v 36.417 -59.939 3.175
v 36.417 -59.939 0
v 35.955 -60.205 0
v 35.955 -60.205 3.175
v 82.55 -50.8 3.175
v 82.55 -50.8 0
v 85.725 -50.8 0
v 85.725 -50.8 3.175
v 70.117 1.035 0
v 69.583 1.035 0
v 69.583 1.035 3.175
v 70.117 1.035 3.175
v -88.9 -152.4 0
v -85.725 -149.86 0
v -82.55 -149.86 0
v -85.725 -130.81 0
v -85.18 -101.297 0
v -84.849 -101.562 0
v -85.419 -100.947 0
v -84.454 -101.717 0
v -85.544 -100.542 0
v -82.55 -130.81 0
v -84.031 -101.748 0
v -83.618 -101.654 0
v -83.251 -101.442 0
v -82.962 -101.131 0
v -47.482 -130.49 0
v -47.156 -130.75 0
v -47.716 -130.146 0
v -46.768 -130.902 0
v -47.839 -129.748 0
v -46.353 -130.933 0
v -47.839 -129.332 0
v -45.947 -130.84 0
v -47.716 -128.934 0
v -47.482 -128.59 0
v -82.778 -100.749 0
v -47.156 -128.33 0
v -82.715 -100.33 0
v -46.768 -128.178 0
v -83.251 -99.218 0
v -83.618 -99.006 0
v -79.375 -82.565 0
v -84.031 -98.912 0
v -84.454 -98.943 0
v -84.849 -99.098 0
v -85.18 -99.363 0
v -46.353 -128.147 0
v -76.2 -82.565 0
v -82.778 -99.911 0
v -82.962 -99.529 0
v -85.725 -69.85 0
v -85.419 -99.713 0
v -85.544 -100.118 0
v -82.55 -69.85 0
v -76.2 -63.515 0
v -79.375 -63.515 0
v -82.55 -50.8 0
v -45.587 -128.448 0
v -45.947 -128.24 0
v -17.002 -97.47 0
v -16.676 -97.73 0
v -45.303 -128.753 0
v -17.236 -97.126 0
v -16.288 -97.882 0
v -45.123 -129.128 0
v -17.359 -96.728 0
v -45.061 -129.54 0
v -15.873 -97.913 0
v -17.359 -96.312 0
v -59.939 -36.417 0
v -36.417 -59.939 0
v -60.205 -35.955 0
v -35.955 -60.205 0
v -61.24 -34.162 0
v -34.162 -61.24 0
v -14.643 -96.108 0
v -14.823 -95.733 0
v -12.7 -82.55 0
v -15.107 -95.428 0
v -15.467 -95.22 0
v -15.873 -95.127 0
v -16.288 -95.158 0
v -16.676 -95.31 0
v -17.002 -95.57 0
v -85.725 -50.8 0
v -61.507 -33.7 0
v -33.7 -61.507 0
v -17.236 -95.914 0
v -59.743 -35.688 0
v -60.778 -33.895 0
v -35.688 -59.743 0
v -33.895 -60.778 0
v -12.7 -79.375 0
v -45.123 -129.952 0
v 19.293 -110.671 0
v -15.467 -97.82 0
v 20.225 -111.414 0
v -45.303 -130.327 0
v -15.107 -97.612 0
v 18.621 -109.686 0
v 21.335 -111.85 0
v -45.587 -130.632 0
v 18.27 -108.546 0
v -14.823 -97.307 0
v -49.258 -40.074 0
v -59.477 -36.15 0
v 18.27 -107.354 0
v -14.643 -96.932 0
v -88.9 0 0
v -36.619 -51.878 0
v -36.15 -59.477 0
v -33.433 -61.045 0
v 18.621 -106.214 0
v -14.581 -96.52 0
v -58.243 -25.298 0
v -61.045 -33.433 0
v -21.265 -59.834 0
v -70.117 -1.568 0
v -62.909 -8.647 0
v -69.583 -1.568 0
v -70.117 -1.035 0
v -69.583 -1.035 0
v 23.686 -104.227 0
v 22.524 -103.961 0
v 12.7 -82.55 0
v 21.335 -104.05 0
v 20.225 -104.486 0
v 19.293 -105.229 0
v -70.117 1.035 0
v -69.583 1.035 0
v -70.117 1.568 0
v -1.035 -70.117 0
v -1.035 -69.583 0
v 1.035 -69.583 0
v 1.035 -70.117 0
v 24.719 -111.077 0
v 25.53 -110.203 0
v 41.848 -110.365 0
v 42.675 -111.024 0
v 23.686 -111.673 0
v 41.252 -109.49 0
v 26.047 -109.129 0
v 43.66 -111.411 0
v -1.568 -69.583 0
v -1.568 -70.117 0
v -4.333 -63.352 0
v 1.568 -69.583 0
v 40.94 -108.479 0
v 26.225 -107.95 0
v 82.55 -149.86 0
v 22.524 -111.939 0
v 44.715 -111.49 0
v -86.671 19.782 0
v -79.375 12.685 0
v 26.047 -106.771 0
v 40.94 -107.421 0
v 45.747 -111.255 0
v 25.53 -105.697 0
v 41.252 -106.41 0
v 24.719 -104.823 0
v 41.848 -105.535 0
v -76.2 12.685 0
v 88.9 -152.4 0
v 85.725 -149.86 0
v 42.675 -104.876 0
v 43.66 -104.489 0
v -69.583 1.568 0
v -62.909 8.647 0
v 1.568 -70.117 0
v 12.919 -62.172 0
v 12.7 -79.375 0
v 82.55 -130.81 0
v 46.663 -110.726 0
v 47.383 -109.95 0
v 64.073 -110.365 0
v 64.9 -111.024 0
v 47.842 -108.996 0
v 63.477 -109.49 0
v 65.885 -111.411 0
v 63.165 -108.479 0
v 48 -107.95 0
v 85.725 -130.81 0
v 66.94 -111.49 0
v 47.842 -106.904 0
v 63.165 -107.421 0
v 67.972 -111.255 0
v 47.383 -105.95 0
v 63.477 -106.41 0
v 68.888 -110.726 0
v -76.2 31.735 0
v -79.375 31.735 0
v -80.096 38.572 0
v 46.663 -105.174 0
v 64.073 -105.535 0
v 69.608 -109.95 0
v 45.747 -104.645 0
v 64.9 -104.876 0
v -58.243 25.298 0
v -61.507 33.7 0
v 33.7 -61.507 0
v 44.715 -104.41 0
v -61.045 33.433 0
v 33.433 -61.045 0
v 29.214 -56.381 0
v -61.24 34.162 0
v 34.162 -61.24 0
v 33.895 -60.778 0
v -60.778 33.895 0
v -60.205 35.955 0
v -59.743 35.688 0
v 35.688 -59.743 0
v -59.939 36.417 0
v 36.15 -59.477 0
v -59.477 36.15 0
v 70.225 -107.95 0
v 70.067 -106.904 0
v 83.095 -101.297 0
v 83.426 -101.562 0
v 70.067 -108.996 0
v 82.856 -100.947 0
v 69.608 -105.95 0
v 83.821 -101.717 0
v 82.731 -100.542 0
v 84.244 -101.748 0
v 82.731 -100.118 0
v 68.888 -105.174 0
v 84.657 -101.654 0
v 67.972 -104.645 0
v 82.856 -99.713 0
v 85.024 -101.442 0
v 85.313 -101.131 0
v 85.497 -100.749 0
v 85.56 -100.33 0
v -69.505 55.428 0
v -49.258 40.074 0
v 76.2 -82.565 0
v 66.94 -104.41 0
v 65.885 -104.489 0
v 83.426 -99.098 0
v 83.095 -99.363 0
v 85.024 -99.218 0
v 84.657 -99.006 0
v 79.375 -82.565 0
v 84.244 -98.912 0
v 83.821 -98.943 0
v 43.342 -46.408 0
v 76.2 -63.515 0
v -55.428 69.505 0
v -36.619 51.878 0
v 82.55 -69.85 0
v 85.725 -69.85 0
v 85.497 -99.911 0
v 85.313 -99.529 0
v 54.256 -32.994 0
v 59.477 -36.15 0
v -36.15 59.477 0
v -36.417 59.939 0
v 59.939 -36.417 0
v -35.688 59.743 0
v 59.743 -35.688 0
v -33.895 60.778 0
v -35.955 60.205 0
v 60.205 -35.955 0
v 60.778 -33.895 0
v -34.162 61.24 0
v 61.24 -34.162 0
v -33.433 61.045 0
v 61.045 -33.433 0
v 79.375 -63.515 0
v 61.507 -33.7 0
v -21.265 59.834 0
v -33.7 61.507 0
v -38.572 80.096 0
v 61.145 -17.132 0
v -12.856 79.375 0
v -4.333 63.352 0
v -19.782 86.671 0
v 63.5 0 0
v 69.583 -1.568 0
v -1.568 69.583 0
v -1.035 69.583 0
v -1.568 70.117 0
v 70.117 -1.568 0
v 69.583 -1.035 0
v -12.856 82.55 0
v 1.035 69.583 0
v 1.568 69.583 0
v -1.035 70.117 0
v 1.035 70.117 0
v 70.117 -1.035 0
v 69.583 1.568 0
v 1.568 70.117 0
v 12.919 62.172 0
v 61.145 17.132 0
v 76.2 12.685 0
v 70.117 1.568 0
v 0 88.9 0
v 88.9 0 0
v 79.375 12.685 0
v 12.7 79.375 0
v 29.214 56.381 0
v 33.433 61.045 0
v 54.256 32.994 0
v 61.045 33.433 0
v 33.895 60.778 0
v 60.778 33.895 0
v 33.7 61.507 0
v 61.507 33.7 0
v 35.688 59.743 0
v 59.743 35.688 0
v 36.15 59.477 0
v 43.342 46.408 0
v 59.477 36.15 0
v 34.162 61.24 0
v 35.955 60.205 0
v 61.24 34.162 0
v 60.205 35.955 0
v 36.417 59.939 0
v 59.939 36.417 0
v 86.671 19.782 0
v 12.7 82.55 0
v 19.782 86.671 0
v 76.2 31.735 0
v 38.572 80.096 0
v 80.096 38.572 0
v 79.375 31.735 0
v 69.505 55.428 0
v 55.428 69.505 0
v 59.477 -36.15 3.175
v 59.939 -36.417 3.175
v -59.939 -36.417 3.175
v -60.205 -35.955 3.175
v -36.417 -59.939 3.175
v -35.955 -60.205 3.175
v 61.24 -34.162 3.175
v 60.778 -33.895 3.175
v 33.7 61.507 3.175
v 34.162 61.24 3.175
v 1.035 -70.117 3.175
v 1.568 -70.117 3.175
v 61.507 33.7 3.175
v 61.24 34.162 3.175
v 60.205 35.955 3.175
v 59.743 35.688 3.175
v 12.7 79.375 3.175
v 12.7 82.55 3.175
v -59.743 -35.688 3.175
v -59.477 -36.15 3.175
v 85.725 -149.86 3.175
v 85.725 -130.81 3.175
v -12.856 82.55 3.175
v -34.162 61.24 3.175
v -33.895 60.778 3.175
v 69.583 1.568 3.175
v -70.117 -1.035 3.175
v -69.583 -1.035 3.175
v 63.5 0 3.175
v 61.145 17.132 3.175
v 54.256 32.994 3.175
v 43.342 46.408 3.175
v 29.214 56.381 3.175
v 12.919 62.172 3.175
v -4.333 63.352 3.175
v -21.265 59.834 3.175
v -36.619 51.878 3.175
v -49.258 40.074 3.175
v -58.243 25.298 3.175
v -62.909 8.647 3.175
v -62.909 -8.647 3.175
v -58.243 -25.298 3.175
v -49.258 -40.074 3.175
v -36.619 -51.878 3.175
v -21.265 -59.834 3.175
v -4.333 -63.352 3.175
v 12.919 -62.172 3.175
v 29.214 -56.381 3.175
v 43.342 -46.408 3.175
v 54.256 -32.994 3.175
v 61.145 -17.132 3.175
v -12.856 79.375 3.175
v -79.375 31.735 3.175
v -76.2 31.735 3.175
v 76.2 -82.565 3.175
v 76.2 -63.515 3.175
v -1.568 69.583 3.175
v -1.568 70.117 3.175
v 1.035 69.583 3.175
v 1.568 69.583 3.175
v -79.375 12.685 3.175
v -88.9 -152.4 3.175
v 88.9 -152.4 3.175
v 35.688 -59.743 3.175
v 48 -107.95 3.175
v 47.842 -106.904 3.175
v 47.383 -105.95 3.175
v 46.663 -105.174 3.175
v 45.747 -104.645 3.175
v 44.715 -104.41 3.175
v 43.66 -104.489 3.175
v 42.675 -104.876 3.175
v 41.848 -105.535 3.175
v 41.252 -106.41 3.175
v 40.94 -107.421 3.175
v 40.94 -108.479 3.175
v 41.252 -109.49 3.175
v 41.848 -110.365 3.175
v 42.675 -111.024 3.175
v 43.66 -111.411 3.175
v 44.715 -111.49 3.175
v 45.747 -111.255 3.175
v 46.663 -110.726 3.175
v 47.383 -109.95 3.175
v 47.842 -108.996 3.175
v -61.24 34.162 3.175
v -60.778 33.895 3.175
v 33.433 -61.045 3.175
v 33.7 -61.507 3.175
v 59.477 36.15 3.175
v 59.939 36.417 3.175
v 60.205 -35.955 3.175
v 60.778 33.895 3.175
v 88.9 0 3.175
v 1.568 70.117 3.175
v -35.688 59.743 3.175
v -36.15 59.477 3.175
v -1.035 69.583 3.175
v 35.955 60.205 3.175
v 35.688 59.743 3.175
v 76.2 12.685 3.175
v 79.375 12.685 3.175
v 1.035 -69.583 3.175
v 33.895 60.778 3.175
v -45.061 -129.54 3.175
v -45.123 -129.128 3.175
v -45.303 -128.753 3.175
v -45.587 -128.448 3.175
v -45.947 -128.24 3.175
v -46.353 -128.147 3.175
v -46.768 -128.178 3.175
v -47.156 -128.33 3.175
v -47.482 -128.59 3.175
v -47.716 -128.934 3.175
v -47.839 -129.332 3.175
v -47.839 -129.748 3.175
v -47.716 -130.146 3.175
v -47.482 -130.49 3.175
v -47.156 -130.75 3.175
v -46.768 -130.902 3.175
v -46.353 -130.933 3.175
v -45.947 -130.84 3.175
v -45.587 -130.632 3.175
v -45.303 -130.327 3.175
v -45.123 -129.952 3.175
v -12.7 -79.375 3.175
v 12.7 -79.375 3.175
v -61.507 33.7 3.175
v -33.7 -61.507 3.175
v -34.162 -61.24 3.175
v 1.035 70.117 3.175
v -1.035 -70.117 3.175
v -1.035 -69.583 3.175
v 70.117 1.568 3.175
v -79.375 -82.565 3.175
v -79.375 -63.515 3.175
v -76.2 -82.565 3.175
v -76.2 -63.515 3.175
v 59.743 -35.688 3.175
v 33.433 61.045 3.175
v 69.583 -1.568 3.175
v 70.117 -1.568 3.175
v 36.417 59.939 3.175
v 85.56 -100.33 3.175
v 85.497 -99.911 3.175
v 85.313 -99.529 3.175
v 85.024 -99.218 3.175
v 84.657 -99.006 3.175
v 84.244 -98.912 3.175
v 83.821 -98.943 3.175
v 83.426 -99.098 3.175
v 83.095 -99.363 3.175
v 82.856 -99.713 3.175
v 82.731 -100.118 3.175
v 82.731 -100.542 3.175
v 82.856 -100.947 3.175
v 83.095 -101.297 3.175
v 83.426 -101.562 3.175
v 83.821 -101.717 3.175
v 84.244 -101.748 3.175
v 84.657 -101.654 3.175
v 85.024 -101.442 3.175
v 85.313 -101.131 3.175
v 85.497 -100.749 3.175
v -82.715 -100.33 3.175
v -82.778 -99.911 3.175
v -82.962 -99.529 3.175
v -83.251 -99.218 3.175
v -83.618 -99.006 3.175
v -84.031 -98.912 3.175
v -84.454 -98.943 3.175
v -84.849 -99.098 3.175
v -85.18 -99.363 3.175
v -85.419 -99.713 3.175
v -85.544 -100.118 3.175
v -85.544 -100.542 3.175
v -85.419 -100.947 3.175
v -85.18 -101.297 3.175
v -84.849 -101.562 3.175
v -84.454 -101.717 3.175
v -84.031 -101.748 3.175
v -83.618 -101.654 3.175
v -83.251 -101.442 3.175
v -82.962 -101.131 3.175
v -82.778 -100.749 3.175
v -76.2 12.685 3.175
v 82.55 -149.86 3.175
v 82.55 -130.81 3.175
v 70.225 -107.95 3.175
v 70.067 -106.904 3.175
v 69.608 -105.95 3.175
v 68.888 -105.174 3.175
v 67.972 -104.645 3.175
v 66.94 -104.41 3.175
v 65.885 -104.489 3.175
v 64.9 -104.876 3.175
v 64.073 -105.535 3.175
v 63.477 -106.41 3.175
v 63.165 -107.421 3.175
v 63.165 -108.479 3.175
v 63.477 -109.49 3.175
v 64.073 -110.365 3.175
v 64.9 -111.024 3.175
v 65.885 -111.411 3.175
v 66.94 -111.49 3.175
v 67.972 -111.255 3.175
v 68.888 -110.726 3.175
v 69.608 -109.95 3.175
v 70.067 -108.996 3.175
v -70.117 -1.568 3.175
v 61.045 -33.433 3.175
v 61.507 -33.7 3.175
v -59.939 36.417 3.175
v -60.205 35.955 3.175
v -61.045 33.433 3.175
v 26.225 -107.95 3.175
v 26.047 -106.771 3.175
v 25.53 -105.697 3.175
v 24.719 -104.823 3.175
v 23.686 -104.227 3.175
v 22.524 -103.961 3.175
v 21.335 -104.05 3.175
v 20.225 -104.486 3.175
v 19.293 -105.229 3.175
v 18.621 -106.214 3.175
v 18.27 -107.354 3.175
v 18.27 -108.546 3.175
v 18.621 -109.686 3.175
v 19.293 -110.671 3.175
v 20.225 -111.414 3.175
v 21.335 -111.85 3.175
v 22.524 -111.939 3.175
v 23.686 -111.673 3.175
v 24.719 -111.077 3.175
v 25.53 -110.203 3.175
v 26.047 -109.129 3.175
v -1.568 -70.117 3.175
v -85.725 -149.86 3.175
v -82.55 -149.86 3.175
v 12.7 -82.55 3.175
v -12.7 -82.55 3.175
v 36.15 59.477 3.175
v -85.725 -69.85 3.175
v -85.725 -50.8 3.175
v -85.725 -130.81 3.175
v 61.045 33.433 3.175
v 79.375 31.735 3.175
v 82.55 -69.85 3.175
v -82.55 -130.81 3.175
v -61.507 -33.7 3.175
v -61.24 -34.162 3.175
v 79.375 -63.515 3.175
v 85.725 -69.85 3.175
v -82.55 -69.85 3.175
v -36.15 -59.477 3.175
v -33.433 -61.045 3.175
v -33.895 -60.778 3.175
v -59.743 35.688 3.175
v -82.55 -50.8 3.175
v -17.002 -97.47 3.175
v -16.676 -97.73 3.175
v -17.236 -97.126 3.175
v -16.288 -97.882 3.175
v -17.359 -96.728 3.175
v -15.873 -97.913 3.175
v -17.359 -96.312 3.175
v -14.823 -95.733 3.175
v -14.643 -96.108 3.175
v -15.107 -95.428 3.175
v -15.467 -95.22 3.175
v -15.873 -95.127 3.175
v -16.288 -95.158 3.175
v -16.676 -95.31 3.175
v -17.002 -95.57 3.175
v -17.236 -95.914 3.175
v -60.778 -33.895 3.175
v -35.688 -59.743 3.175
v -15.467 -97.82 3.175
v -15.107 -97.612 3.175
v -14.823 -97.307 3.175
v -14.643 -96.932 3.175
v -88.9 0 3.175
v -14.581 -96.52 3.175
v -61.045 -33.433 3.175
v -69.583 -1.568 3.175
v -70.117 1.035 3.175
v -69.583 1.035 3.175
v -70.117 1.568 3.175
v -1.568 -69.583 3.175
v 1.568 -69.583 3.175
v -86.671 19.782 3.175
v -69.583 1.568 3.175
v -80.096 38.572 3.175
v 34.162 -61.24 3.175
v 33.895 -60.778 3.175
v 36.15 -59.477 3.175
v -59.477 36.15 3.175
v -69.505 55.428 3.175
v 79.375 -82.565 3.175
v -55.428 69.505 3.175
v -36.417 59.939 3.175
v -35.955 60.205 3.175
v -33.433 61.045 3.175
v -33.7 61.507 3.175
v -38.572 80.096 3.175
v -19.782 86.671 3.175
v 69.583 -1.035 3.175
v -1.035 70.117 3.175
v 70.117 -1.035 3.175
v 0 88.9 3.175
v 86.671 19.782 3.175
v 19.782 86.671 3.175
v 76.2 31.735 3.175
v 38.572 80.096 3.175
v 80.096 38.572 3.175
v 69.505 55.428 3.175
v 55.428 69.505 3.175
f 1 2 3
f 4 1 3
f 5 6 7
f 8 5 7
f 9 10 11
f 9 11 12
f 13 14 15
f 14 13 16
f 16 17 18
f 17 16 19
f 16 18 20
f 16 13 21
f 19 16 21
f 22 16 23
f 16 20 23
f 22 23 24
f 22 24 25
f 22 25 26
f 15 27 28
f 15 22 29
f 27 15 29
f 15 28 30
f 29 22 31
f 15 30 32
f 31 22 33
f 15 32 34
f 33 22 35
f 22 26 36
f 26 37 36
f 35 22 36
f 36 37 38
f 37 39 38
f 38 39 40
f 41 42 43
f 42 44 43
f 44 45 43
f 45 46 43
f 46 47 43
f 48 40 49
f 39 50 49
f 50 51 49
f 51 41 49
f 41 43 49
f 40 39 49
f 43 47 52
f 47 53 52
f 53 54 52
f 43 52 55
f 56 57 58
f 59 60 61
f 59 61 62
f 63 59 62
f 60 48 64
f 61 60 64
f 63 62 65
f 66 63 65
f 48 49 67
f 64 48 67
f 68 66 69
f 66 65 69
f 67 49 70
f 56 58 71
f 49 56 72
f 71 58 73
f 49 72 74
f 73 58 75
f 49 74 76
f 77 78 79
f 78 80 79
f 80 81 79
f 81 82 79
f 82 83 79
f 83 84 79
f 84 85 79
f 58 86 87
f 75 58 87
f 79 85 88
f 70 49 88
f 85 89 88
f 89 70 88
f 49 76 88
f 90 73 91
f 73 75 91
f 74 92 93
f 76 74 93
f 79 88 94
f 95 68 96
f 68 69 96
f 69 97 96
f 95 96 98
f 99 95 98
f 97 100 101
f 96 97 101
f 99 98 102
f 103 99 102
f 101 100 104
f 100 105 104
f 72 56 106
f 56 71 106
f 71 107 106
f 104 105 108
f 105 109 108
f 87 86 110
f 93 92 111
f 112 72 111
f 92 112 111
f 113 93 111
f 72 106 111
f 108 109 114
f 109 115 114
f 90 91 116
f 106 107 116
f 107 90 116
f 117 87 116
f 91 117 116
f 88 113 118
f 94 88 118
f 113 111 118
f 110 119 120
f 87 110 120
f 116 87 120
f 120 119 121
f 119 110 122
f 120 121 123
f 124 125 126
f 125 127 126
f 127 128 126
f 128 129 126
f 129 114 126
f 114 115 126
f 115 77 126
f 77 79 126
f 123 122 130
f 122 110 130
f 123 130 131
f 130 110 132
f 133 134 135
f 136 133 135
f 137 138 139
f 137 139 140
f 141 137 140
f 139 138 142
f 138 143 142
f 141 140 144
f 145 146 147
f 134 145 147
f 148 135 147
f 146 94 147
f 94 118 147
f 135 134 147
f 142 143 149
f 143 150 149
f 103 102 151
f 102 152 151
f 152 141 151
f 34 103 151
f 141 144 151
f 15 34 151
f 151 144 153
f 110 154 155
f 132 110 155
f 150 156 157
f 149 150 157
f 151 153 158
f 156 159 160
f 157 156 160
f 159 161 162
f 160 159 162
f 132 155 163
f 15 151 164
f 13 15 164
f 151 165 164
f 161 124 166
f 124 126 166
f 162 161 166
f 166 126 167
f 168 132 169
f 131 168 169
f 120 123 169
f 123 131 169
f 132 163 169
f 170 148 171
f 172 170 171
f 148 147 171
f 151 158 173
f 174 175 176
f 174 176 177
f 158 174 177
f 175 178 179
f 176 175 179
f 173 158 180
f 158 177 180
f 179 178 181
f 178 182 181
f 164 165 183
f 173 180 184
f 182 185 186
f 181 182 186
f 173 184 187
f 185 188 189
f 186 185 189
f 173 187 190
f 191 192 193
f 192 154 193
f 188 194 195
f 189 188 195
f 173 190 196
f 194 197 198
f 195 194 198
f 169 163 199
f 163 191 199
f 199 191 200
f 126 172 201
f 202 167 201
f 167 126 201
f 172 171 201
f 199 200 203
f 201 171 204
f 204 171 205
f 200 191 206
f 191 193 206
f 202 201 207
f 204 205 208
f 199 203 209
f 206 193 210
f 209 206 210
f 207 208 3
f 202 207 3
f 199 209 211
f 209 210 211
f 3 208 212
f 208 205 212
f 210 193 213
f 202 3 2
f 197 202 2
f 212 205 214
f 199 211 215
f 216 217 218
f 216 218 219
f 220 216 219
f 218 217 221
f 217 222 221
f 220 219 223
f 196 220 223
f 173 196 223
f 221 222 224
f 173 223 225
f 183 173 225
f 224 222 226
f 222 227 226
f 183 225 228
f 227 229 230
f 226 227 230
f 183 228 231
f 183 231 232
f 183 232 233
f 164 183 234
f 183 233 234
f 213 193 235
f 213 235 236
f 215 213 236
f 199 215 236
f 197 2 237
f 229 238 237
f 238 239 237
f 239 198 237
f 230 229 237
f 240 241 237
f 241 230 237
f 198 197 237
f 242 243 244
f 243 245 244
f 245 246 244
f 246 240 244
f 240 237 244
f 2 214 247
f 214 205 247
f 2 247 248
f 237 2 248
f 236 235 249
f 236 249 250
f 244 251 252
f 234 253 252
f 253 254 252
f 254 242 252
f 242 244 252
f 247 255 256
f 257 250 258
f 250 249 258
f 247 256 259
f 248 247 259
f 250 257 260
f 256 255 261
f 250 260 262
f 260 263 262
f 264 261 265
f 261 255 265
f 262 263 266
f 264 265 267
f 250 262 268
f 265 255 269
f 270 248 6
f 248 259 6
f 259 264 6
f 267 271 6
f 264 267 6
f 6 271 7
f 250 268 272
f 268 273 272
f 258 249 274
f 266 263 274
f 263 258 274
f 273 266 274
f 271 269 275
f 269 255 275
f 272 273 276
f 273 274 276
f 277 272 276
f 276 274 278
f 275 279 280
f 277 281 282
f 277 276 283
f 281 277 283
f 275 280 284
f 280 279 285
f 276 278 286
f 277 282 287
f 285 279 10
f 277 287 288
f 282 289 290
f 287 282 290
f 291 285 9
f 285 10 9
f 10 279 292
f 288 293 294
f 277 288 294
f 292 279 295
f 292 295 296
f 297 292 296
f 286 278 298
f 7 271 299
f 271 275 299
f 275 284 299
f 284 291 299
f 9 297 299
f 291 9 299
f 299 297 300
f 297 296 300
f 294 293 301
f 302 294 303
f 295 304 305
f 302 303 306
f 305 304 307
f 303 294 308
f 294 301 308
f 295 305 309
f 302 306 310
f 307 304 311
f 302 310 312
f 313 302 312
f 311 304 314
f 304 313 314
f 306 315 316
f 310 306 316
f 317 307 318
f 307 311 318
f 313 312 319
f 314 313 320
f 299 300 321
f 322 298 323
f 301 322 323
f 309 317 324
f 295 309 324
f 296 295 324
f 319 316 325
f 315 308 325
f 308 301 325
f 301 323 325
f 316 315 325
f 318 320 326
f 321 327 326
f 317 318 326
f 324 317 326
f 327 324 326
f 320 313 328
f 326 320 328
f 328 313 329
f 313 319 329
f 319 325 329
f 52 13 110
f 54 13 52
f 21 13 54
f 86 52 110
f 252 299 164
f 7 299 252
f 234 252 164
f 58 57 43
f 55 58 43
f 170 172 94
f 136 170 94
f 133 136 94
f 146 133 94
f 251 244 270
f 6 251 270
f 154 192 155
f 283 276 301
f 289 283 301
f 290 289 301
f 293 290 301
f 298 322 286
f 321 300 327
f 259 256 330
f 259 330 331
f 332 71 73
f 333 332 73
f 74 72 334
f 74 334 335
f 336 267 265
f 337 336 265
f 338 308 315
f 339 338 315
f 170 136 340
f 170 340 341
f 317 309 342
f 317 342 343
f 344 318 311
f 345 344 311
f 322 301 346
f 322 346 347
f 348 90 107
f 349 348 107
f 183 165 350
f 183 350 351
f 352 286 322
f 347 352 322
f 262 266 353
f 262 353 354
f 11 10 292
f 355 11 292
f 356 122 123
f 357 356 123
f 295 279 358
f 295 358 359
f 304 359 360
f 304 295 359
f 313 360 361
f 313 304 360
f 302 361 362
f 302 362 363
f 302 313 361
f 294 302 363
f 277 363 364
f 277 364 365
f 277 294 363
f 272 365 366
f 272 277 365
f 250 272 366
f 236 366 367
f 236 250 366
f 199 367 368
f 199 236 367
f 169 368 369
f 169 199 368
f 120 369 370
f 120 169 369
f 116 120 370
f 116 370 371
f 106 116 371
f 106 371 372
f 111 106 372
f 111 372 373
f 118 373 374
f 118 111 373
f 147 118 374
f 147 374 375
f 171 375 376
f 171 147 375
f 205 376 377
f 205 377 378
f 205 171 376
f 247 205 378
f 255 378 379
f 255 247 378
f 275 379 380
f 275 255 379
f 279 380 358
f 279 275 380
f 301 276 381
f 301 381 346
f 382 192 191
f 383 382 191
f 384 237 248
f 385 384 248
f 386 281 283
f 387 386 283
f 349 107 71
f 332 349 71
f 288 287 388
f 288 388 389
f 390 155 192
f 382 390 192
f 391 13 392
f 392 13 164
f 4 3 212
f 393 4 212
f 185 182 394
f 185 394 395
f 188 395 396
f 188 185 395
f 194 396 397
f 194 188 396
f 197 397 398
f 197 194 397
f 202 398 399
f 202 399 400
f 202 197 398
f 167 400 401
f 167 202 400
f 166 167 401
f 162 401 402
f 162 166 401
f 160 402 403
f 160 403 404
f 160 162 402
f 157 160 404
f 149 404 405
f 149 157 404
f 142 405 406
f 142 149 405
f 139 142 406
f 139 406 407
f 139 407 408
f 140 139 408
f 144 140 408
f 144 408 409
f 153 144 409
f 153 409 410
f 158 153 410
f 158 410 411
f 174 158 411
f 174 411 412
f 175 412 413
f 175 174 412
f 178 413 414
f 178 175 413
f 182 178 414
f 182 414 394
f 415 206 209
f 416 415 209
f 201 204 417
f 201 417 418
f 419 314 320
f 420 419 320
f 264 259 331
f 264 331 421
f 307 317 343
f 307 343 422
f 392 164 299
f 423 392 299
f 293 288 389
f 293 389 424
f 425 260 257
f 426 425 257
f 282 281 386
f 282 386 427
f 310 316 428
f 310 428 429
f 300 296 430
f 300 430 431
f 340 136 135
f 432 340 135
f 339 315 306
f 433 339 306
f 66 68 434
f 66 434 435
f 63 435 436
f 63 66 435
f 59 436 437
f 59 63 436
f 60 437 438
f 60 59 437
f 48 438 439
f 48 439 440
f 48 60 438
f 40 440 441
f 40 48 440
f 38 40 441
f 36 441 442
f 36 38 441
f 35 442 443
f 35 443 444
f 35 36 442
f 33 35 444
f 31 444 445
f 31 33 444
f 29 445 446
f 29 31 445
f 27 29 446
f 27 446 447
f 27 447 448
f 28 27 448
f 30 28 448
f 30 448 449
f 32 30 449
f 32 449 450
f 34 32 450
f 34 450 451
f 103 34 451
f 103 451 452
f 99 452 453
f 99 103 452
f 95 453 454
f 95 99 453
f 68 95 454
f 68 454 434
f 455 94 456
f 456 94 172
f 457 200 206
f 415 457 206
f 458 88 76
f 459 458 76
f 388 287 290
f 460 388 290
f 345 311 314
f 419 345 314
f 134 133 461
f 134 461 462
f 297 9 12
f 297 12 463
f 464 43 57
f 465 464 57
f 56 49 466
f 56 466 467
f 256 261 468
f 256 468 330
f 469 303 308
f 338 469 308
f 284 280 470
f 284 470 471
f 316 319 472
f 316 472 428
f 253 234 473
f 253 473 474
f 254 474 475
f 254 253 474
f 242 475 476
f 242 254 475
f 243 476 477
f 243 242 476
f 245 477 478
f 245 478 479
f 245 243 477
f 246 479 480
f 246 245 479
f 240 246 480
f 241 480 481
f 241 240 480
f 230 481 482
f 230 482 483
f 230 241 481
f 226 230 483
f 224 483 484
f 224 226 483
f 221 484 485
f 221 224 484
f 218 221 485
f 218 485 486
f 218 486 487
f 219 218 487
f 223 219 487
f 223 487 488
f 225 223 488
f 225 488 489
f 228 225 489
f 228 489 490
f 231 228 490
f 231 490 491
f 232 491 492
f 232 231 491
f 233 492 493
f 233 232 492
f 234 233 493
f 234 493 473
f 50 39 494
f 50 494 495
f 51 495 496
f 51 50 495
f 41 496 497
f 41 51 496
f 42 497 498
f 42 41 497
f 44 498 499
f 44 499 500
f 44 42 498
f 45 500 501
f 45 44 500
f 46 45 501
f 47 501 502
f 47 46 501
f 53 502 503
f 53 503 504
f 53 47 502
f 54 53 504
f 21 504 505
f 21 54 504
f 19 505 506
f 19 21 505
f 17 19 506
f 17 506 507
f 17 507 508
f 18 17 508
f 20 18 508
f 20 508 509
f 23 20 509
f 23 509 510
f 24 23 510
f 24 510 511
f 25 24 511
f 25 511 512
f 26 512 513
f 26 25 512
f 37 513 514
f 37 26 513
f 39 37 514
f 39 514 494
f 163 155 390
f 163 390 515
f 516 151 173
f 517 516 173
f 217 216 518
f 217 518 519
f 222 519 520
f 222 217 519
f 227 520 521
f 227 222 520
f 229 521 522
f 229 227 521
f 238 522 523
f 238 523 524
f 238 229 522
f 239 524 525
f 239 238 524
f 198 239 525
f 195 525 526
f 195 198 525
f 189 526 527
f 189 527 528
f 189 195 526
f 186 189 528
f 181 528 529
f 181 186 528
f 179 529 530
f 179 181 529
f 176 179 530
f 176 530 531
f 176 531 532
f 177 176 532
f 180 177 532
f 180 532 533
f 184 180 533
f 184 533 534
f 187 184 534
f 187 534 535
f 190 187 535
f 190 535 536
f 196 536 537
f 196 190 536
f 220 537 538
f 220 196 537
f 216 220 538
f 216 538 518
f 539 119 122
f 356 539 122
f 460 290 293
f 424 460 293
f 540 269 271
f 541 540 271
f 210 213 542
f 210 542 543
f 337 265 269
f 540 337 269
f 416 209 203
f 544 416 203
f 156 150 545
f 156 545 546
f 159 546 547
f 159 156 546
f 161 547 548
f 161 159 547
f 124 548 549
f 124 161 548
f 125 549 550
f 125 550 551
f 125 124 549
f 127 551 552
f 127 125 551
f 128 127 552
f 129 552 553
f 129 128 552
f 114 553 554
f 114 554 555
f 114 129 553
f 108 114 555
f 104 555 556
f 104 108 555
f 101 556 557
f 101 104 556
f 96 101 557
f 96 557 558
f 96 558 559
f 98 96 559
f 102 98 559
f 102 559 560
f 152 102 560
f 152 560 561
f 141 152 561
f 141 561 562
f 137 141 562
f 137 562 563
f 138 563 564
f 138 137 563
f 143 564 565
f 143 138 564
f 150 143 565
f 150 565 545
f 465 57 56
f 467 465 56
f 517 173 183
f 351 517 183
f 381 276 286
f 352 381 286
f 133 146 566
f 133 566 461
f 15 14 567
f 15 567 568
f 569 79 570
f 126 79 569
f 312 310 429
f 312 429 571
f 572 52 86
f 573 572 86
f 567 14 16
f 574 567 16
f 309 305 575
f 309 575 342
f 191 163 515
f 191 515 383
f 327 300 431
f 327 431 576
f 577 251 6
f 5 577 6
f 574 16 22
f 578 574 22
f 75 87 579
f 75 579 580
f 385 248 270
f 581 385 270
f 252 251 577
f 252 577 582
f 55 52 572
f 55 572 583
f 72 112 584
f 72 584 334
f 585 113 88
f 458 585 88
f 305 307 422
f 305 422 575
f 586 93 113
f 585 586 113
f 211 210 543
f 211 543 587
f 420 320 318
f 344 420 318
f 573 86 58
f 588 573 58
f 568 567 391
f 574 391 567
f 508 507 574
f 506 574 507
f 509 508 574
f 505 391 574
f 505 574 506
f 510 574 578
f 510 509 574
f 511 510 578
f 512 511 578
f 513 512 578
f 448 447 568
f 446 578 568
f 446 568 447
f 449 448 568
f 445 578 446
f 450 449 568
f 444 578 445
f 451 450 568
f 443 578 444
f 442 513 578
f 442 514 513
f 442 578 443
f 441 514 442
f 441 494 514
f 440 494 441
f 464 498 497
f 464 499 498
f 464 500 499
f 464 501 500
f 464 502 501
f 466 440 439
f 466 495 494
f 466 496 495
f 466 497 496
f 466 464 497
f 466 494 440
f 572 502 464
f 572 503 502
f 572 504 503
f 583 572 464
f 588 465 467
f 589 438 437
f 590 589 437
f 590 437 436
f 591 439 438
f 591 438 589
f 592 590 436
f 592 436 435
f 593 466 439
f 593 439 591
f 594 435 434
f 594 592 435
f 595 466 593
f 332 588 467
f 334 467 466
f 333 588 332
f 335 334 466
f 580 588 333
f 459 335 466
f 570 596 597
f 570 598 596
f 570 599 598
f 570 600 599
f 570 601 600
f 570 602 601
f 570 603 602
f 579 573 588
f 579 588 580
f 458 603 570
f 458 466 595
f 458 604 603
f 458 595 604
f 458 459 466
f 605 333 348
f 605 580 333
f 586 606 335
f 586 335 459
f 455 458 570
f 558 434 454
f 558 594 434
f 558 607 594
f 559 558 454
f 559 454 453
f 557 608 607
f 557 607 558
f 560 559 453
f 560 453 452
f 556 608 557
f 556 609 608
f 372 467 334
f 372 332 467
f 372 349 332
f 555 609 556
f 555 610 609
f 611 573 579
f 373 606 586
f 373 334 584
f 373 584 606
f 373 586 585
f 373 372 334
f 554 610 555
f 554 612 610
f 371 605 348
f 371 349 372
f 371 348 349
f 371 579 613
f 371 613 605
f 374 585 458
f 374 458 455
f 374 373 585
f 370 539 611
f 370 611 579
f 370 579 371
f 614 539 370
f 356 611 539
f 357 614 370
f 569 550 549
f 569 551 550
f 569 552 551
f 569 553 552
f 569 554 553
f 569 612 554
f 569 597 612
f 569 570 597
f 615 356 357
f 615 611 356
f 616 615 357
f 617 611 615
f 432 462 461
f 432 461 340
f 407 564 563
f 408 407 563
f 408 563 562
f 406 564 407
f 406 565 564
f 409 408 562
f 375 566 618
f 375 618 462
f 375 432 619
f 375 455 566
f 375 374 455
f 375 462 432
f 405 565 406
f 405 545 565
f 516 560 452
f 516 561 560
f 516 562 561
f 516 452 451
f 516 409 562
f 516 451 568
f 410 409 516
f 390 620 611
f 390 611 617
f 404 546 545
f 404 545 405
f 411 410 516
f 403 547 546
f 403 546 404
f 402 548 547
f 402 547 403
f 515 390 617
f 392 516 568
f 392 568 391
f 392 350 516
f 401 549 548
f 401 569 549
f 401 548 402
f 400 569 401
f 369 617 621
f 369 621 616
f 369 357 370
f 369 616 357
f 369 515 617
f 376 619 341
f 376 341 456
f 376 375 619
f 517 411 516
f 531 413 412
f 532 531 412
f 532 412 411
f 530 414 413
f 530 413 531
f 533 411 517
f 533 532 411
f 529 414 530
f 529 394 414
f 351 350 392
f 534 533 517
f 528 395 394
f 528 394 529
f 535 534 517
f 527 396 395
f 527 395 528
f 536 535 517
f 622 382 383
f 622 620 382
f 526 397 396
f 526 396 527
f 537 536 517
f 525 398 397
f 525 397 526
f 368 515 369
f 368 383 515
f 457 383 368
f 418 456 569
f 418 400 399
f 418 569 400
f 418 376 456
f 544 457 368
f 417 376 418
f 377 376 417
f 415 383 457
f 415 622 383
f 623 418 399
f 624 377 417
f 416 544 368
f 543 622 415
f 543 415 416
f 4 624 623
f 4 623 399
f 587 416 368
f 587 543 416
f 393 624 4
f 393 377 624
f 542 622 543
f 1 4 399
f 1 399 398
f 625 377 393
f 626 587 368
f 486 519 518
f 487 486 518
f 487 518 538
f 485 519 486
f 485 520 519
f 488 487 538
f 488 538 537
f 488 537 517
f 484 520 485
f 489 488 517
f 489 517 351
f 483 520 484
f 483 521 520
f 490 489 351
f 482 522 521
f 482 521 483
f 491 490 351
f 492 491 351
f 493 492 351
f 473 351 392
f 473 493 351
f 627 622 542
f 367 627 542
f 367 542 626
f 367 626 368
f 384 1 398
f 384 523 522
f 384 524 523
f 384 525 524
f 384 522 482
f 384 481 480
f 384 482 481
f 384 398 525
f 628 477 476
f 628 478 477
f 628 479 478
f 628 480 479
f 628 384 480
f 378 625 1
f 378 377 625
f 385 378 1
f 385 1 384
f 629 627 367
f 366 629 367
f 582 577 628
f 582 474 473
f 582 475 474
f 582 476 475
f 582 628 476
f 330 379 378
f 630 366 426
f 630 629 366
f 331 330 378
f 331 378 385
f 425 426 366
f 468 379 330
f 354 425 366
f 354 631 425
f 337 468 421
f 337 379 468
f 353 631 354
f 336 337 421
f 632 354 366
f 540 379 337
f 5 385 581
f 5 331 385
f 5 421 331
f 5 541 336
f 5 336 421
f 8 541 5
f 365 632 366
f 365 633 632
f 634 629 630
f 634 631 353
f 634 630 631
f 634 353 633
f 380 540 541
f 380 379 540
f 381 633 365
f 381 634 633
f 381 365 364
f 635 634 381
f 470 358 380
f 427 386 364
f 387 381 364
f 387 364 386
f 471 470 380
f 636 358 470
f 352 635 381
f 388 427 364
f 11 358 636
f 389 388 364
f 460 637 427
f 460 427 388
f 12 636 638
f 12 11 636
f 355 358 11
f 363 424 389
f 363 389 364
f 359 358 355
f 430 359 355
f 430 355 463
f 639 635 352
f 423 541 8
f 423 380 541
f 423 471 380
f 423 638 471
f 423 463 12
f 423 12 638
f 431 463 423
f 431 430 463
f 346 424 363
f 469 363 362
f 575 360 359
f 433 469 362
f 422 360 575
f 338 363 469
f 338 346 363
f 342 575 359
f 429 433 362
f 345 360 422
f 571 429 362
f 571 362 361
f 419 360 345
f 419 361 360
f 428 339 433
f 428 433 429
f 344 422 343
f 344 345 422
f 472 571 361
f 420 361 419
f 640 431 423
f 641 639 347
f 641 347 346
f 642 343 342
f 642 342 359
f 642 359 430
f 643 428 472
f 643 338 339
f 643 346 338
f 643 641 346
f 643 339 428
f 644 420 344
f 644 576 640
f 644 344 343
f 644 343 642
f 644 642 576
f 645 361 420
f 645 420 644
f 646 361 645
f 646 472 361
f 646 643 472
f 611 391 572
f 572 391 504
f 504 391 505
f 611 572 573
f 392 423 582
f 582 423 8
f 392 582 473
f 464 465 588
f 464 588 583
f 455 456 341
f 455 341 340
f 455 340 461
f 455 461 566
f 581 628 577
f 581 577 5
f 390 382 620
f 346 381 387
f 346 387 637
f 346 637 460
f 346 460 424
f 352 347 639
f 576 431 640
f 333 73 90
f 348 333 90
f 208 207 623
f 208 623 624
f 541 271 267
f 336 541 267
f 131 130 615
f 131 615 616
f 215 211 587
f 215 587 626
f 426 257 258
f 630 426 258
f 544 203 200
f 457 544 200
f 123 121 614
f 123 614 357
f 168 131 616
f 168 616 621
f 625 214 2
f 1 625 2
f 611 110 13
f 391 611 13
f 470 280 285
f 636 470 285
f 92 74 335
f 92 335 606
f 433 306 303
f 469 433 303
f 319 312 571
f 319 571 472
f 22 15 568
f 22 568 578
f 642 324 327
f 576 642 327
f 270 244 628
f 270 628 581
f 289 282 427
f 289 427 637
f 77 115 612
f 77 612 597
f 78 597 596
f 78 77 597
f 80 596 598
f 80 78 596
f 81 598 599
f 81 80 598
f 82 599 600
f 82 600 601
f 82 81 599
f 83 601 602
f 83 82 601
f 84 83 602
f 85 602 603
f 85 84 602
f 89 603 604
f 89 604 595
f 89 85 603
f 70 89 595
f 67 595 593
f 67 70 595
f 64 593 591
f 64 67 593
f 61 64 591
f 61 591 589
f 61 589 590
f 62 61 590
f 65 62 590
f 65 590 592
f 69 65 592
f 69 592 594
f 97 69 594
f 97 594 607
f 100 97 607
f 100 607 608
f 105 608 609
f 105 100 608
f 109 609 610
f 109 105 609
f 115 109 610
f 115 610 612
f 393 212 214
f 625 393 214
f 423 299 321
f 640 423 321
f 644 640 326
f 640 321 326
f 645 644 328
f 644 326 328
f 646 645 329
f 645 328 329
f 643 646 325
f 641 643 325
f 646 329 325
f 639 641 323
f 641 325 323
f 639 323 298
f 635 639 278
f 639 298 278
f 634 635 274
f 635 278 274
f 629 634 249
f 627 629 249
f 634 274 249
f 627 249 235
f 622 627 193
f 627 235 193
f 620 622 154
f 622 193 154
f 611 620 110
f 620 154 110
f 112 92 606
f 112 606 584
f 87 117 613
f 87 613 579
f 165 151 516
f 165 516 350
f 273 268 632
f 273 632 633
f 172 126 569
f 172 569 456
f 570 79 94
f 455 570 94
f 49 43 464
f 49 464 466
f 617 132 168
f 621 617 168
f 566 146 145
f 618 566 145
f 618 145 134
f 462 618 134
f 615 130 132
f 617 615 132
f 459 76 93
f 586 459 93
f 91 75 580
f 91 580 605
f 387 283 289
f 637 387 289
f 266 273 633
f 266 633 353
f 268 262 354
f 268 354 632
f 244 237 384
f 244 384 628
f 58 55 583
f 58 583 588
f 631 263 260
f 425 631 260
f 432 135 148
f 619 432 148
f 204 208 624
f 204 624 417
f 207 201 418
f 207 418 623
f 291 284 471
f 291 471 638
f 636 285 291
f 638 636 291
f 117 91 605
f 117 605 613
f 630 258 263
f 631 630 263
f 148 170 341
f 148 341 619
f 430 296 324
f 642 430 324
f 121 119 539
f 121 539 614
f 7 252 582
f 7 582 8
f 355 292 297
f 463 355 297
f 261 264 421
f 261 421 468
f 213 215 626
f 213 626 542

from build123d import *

# Parameters (mm, degrees)
SKETCH1_R           = 63.5
SKETCH1_R_2         = 1.4224
SKETCH1_R_3         = 4
SKETCH1_R_4         = 3.55
SKETCH1_R_5         = 1.397
SKETCH1_W           = 0.5334
SKETCH1_H           = 0.5334
SKETCH1_W_2         = 3.175
SKETCH1_H_2         = 19.05
SKETCH1_W_3         = 25.556343598
SKETCH1_H_3         = 3.175
SKETCH1_W_4         = 25.4
BOSS_EXTRUDE1_DEPTH = 3.175


with BuildPart() as part:
    # Sketch1 → Boss-Extrude1 (new body)
    with BuildSketch(Plane.XY):
        with BuildLine():
            Line((-88.9, 0), (-88.9, -152.4))
            Line((-88.9, -152.4), (88.9, -152.4))
            Line((88.9, -152.4), (88.9, 0))
            ThreePointArc((88.9, 0), (0, 88.9), (-88.9, 0))
        make_face()
        Circle(SKETCH1_R, mode=Mode.SUBTRACT)
        with Locations((-84.1375, -100.33)):
            Circle(SKETCH1_R_2, mode=Mode.SUBTRACT)
        with Locations((84.1375, -100.33)):
            Circle(SKETCH1_R_2, mode=Mode.SUBTRACT)
        with Locations((22.225, -107.95)):
            Circle(SKETCH1_R_3, mode=Mode.SUBTRACT)
        with Locations((44.45, -107.95)):
            Circle(SKETCH1_R_4, mode=Mode.SUBTRACT)
        with Locations((66.675, -107.95)):
            Circle(SKETCH1_R_4, mode=Mode.SUBTRACT)
        with Locations((-15.977581987, -96.52)):
            Circle(SKETCH1_R_5, mode=Mode.SUBTRACT)
        with Locations((-46.457581987, -129.54)):
            Circle(SKETCH1_R_5, mode=Mode.SUBTRACT)
        with Locations((-1.30175, 69.85)):
            Rectangle(SKETCH1_W, SKETCH1_H, mode=Mode.SUBTRACT)
        with Locations((1.30175, 69.85)):
            Rectangle(SKETCH1_W, SKETCH1_H, mode=Mode.SUBTRACT)
        Polygon((33.700032455, 61.50706843), (34.161970406, 61.24036843), (33.895270406, 60.778430479), (33.433332455, 61.045130479), align=None, mode=Mode.SUBTRACT)
        Polygon((35.954729594, 60.20531843), (35.688029594, 59.743380479), (36.149967545, 59.476680479), (36.416667545, 59.93861843), align=None, mode=Mode.SUBTRACT)
        Polygon((59.93861843, 36.416667545), (60.20531843, 35.954729594), (59.743380479, 35.688029594), (59.476680479, 36.149967545), align=None, mode=Mode.SUBTRACT)
        Polygon((61.24036843, 34.161970406), (60.778430479, 33.895270406), (61.045130479, 33.433332455), (61.50706843, 33.700032455), align=None, mode=Mode.SUBTRACT)
        with Locations((69.85, 1.30175)):
            Rectangle(SKETCH1_W, SKETCH1_H, mode=Mode.SUBTRACT)
        with Locations((69.85, -1.30175)):
            Rectangle(SKETCH1_W, SKETCH1_H, mode=Mode.SUBTRACT)
        Polygon((61.50706843, -33.700032455), (61.24036843, -34.161970406), (60.778430479, -33.895270406), (61.045130479, -33.433332455), align=None, mode=Mode.SUBTRACT)
        Polygon((60.20531843, -35.954729594), (59.743380479, -35.688029594), (59.476680479, -36.149967545), (59.93861843, -36.416667545), align=None, mode=Mode.SUBTRACT)
        Polygon((36.416667545, -59.93861843), (35.954729594, -60.20531843), (35.688029594, -59.743380479), (36.149967545, -59.476680479), align=None, mode=Mode.SUBTRACT)
        Polygon((34.161970406, -61.24036843), (33.895270406, -60.778430479), (33.433332455, -61.045130479), (33.700032455, -61.50706843), align=None, mode=Mode.SUBTRACT)
        with Locations((1.30175, -69.85)):
            Rectangle(SKETCH1_W, SKETCH1_H, mode=Mode.SUBTRACT)
        with Locations((-1.30175, -69.85)):
            Rectangle(SKETCH1_W, SKETCH1_H, mode=Mode.SUBTRACT)
        Polygon((-33.700032455, -61.50706843), (-34.161970406, -61.24036843), (-33.895270406, -60.778430479), (-33.433332455, -61.045130479), align=None, mode=Mode.SUBTRACT)
        Polygon((-35.954729594, -60.20531843), (-35.688029594, -59.743380479), (-36.149967545, -59.476680479), (-36.416667545, -59.93861843), align=None, mode=Mode.SUBTRACT)
        Polygon((-59.93861843, -36.416667545), (-60.20531843, -35.954729594), (-59.743380479, -35.688029594), (-59.476680479, -36.149967545), align=None, mode=Mode.SUBTRACT)
        Polygon((-61.24036843, -34.161970406), (-60.778430479, -33.895270406), (-61.045130479, -33.433332455), (-61.50706843, -33.700032455), align=None, mode=Mode.SUBTRACT)
        with Locations((-69.85, -1.30175)):
            Rectangle(SKETCH1_W, SKETCH1_H, mode=Mode.SUBTRACT)
        with Locations((-69.85, 1.30175)):
            Rectangle(SKETCH1_W, SKETCH1_H, mode=Mode.SUBTRACT)
        Polygon((-61.50706843, 33.700032455), (-61.24036843, 34.161970406), (-60.778430479, 33.895270406), (-61.045130479, 33.433332455), align=None, mode=Mode.SUBTRACT)
        Polygon((-60.20531843, 35.954729594), (-59.743380479, 35.688029594), (-59.476680479, 36.149967545), (-59.93861843, 36.416667545), align=None, mode=Mode.SUBTRACT)
        Polygon((-36.416667545, 59.93861843), (-35.954729594, 60.20531843), (-35.688029594, 59.743380479), (-36.149967545, 59.476680479), align=None, mode=Mode.SUBTRACT)
        Polygon((-34.161970406, 61.24036843), (-33.895270406, 60.778430479), (-33.433332455, 61.045130479), (-33.700032455, 61.50706843), align=None, mode=Mode.SUBTRACT)
        with Locations((-77.7875, 22.20976)):
            Rectangle(SKETCH1_W_2, SKETCH1_H_2, mode=Mode.SUBTRACT)
        with Locations((-77.7875, -73.04024)):
            Rectangle(SKETCH1_W_2, SKETCH1_H_2, mode=Mode.SUBTRACT)
        with Locations((-84.1375, -140.335)):
            Rectangle(SKETCH1_W_2, SKETCH1_H_2, mode=Mode.SUBTRACT)
        with Locations((-84.1375, -60.325)):
            Rectangle(SKETCH1_W_2, SKETCH1_H_2, mode=Mode.SUBTRACT)
        with Locations((84.1375, -140.335)):
            Rectangle(SKETCH1_W_2, SKETCH1_H_2, mode=Mode.SUBTRACT)
        with Locations((77.7875, 22.20976)):
            Rectangle(SKETCH1_W_2, SKETCH1_H_2, mode=Mode.SUBTRACT)
        with Locations((84.1375, -60.325)):
            Rectangle(SKETCH1_W_2, SKETCH1_H_2, mode=Mode.SUBTRACT)
        with Locations((77.7875, -73.04024)):
            Rectangle(SKETCH1_W_2, SKETCH1_H_2, mode=Mode.SUBTRACT)
        with Locations((-0.078171799, 80.9625)):
            Rectangle(SKETCH1_W_3, SKETCH1_H_3, mode=Mode.SUBTRACT)
        with Locations((0, -80.9625)):
            Rectangle(SKETCH1_W_4, SKETCH1_H_3, mode=Mode.SUBTRACT)
    extrude(amount=BOSS_EXTRUDE1_DEPTH)


solid = part.part
